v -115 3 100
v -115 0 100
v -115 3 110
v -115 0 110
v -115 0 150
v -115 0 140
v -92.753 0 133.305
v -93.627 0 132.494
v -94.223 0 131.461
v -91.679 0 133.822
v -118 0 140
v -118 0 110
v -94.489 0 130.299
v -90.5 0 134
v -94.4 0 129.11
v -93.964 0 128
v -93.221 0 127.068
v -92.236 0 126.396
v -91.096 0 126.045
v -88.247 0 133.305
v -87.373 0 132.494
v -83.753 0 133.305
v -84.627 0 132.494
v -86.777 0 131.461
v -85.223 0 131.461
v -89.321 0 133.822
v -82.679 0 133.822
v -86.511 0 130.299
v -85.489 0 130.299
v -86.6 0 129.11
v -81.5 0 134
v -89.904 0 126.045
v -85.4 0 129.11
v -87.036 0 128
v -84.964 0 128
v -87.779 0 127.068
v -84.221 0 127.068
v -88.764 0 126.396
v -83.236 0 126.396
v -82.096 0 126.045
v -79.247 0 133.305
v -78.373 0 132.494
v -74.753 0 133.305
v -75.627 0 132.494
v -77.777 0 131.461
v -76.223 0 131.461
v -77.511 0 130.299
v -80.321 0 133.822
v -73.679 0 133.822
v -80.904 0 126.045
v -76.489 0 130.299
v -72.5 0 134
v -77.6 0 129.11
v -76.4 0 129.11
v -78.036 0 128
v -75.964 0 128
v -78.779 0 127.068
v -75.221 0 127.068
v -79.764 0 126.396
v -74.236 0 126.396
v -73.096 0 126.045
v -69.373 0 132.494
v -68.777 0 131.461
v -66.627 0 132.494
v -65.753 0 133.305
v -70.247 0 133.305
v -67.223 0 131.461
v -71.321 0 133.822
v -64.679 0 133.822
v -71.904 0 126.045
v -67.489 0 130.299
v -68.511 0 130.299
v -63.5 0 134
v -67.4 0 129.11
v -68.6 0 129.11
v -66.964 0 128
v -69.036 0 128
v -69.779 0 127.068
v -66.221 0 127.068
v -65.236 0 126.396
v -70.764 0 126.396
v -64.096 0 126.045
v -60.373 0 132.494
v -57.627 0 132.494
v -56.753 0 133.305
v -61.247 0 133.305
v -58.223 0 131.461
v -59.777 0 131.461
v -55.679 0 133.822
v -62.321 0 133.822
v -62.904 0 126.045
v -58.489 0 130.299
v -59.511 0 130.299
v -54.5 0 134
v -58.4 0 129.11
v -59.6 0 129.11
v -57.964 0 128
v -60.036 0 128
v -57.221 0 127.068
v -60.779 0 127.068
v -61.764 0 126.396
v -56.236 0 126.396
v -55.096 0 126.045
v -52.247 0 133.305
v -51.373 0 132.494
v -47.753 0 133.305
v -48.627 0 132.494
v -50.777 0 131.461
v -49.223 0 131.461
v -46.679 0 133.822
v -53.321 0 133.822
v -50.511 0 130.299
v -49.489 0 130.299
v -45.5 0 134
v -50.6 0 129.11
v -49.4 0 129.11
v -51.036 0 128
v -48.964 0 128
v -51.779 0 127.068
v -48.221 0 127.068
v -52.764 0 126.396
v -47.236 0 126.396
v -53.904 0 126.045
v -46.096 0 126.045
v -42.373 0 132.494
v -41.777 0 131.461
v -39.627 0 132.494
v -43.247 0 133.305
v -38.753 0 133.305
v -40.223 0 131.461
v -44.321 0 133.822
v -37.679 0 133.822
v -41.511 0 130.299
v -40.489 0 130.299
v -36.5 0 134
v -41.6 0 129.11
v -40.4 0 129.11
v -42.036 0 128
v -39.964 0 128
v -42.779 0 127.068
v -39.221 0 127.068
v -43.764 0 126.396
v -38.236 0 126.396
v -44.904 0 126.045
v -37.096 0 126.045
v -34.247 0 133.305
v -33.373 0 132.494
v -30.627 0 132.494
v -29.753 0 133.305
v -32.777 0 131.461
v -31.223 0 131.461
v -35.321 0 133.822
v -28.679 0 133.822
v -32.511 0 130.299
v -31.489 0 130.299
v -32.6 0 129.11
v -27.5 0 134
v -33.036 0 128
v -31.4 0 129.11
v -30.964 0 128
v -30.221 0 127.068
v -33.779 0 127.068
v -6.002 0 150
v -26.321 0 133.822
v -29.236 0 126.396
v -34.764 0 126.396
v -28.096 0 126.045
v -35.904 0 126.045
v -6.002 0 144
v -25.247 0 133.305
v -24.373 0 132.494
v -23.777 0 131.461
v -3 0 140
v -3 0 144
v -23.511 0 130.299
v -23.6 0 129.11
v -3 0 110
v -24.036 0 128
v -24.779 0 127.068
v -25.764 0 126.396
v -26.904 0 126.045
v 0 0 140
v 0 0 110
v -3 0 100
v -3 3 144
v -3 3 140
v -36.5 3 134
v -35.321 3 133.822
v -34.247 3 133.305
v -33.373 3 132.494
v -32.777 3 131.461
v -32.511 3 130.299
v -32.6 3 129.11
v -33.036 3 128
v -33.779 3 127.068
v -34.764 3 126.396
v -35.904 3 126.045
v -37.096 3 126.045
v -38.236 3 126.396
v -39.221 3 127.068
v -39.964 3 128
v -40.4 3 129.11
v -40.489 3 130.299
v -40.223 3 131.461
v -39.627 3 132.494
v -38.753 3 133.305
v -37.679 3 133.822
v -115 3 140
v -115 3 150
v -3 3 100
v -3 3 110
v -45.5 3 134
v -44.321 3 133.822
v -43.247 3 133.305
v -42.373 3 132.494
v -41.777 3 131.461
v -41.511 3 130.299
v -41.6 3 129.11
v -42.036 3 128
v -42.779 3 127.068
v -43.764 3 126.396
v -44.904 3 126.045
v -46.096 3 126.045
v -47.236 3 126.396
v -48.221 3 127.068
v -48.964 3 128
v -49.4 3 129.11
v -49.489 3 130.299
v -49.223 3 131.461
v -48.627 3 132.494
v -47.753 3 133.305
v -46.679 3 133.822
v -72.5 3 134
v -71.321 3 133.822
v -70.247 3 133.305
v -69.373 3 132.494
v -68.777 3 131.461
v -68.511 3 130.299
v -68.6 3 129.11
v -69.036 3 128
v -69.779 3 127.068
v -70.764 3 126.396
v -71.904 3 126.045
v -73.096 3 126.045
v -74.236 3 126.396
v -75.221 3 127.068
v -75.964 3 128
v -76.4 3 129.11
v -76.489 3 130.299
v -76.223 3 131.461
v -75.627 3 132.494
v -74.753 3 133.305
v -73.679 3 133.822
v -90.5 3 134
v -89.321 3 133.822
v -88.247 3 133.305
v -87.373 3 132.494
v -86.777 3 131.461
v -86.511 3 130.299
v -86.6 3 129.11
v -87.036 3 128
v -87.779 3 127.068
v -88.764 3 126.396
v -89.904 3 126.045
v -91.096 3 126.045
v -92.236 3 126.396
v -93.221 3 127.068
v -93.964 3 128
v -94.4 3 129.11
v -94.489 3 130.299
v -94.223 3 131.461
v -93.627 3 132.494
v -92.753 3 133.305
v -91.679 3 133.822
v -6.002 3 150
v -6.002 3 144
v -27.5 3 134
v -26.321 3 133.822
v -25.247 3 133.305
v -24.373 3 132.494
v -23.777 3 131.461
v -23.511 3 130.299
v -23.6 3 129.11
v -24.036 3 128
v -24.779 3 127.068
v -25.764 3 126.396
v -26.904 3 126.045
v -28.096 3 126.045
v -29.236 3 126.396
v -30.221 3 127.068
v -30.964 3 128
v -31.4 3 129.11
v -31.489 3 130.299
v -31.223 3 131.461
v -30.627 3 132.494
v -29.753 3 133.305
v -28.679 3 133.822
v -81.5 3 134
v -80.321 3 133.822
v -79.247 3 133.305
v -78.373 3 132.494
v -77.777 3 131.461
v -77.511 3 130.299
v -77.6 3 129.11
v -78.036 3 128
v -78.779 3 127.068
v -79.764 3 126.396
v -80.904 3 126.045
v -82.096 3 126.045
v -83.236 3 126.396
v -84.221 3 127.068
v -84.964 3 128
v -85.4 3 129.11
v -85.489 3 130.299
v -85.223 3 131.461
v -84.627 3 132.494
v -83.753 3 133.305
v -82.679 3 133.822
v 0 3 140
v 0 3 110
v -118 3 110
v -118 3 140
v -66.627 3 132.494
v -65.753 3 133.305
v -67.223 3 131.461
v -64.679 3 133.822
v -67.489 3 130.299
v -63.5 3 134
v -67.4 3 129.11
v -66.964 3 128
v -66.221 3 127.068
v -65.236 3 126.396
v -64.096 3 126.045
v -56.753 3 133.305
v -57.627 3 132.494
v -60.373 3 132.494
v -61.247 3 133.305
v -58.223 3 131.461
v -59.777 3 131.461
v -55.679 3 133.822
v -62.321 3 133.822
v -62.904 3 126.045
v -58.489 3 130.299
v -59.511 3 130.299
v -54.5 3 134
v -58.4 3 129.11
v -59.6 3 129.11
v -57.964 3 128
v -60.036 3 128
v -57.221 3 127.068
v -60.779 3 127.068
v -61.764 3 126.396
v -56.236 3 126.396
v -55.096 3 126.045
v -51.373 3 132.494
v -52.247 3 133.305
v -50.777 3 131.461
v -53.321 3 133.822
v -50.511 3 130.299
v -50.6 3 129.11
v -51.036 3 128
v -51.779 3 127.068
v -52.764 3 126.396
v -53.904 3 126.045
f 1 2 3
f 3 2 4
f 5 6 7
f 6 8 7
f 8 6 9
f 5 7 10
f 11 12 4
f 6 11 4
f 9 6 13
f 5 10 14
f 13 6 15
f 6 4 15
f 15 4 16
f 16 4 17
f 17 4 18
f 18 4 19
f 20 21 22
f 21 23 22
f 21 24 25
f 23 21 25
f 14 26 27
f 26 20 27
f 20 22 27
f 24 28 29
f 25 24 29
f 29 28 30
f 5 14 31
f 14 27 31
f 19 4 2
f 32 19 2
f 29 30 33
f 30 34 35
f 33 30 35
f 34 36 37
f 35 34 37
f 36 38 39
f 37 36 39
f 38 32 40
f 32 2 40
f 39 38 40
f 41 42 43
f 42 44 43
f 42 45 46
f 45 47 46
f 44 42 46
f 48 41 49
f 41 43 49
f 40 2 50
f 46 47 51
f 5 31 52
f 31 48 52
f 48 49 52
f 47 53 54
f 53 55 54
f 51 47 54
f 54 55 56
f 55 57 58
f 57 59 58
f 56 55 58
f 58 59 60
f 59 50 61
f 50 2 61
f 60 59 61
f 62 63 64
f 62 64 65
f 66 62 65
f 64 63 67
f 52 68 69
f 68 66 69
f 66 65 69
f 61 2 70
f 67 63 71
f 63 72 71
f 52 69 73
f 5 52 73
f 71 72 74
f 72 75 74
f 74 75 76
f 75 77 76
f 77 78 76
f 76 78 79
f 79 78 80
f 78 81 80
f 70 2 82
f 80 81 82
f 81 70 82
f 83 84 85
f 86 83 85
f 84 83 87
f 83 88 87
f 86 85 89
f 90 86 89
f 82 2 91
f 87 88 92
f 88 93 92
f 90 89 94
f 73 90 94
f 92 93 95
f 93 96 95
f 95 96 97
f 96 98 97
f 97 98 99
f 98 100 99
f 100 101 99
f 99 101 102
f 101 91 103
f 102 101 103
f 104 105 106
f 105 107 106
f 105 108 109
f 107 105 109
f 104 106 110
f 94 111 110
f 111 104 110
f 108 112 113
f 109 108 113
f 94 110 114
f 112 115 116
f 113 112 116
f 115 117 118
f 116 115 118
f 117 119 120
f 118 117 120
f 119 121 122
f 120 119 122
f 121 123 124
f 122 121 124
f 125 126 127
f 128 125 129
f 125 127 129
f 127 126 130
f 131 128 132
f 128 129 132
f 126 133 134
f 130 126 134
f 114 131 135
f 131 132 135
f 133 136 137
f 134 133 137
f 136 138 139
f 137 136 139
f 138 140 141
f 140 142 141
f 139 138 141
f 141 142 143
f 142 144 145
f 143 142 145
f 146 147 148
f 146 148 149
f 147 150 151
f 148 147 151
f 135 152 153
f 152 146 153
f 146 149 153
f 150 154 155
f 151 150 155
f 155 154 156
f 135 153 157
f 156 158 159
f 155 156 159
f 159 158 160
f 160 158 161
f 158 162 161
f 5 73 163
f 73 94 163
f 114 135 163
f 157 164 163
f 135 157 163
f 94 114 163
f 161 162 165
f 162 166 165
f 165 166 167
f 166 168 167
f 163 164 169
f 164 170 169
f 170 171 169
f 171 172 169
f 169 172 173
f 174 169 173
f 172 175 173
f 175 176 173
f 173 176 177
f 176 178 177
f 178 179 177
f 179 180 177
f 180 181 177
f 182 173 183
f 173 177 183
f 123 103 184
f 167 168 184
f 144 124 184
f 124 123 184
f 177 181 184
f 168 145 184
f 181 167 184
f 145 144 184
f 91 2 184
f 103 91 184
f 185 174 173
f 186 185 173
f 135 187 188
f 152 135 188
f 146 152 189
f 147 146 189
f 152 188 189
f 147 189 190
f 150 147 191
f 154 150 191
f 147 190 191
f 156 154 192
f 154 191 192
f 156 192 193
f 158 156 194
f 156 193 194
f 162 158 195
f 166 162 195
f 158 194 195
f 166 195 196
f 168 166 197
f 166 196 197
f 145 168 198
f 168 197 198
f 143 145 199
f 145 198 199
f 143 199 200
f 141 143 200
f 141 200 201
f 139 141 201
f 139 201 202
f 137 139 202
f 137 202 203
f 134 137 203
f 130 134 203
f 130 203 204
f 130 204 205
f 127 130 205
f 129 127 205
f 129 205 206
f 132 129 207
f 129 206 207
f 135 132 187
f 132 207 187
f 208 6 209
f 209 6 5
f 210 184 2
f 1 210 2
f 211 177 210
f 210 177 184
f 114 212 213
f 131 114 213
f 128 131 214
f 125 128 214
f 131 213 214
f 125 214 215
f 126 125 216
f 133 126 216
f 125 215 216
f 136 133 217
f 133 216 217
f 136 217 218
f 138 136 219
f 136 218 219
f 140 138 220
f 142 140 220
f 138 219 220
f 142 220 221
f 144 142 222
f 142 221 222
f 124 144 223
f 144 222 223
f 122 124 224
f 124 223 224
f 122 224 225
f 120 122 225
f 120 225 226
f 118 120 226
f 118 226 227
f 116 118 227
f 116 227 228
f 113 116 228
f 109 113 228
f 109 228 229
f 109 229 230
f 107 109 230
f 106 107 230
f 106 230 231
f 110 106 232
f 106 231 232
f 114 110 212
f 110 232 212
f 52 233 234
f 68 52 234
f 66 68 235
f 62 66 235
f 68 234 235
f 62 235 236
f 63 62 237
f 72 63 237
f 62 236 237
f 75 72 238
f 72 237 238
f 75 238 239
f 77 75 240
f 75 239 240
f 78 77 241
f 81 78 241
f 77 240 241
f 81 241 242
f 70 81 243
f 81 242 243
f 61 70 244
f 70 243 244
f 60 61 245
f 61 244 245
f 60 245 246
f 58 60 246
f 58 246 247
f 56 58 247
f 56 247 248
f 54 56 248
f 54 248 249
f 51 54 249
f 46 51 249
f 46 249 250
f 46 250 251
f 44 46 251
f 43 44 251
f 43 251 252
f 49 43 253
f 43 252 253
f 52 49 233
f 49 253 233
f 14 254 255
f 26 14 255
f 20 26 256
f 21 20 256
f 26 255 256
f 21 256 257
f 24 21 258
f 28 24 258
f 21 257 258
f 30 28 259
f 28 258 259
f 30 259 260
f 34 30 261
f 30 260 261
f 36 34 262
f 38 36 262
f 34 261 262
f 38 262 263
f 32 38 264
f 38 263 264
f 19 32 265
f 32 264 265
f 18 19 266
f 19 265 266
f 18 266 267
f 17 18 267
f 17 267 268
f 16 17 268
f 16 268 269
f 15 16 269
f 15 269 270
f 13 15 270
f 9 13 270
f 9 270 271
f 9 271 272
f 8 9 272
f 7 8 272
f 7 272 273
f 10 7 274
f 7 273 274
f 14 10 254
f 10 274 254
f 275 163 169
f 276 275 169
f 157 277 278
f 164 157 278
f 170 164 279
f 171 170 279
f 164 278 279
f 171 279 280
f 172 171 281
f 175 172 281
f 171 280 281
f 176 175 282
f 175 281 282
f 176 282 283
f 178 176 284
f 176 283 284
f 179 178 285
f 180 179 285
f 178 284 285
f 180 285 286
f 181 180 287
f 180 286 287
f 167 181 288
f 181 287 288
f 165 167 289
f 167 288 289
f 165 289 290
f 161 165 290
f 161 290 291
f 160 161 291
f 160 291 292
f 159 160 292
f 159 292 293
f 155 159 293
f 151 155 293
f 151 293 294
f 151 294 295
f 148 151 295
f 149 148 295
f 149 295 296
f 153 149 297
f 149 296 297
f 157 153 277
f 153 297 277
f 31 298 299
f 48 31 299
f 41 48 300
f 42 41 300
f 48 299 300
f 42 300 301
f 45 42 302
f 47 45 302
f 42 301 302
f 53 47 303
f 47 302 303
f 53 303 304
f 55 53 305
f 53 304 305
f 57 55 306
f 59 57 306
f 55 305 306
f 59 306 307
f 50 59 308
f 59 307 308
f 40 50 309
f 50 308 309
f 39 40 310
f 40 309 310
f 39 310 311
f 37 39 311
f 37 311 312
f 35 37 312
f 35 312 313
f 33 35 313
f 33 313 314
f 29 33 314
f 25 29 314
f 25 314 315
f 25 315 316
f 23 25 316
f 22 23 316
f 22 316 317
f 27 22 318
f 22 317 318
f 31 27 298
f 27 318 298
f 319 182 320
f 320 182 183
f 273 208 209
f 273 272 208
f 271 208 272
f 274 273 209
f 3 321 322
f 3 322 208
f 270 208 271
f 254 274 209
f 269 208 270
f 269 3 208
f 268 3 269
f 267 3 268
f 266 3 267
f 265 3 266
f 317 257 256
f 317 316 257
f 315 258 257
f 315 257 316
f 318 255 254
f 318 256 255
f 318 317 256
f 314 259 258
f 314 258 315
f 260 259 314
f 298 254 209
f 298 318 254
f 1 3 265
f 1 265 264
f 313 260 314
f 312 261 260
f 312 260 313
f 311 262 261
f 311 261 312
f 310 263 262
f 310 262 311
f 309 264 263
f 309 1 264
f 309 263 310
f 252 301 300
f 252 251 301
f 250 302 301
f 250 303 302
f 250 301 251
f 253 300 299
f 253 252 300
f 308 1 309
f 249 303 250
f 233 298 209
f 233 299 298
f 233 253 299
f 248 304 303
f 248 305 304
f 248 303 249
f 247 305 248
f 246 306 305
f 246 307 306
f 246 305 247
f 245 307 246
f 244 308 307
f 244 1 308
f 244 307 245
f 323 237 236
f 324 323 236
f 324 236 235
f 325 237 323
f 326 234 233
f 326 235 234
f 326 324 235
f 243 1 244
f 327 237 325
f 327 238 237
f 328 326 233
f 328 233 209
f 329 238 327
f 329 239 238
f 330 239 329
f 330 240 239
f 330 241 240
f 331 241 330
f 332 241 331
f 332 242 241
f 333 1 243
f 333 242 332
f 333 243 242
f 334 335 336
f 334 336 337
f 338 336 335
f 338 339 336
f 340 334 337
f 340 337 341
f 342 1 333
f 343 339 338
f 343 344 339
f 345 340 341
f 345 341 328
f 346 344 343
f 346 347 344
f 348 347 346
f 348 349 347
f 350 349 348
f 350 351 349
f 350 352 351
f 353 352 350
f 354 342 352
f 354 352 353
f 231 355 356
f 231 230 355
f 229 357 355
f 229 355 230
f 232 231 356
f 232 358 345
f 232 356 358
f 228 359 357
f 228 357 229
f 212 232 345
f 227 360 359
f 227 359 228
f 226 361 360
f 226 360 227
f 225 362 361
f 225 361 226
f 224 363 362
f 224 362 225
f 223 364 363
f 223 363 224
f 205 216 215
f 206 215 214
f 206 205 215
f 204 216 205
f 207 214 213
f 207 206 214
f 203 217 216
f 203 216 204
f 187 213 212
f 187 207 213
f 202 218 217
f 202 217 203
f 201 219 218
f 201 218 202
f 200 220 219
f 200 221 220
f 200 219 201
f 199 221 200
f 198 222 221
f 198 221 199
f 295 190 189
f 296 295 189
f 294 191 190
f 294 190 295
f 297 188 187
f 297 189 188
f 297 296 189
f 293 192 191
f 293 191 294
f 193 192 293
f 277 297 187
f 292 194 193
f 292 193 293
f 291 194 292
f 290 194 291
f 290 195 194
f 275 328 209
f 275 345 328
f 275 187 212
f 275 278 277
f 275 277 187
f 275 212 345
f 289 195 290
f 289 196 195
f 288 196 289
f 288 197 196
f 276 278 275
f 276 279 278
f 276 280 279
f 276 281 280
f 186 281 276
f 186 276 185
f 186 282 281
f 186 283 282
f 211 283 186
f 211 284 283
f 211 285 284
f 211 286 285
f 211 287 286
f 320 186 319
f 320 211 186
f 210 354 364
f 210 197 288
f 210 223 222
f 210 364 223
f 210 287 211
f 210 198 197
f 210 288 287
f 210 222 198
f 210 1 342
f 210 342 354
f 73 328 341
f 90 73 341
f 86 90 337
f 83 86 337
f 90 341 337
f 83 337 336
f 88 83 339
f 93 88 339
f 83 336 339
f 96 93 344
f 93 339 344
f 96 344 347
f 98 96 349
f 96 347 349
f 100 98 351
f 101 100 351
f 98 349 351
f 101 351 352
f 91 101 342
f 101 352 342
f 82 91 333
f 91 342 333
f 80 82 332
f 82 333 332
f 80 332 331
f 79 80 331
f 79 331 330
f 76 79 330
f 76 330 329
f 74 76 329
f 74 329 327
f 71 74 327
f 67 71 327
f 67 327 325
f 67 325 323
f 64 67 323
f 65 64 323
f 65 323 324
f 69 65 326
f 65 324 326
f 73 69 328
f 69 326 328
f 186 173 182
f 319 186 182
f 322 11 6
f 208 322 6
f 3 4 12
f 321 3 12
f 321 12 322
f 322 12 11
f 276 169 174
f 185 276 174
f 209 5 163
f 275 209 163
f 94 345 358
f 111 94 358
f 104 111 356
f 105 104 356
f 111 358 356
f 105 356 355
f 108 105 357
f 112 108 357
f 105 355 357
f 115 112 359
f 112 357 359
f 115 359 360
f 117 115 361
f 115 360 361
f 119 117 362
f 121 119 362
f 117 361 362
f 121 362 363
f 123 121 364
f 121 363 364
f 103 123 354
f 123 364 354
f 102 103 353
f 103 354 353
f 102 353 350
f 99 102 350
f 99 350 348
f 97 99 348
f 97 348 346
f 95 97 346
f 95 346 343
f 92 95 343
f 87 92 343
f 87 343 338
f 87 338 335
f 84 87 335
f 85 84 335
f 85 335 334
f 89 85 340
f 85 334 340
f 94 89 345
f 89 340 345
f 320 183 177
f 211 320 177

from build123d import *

# Parameters (mm, degrees)
LED_1_OUTLINE_R     = 2.25
LED_1_DEPTH         = 3
SKETCH_1_R          = 4
CUT_EXTRUDE_1_DEPTH = 3


# Read off the part's stored shape, not the designer's step: 基体零件-LED板-1
with BuildPart() as part:
    # 基体零件-LED板-1 outline → 基体零件-LED板-1 (new body)
    with BuildSketch(Plane(origin=(0, 0, 0), x_dir=(1, 0, 0), z_dir=(0, 1, 0))):
        Polygon((-3, -140), (0, -140), (0, -110), (-3, -110), (-3, -100), (-115, -100), (-115, -110), (-118, -110), (-118, -140), (-115, -140), (-115, -150), (-6.001970153, -150), (-6.001970153, -144), (-3, -144), align=None)
        with Locations((-90.5, -130)):
            Circle(LED_1_OUTLINE_R, mode=Mode.SUBTRACT)
        with Locations((-81.5, -130)):
            Circle(LED_1_OUTLINE_R, mode=Mode.SUBTRACT)
        with Locations((-72.5, -130)):
            Circle(LED_1_OUTLINE_R, mode=Mode.SUBTRACT)
        with Locations((-63.5, -130)):
            Circle(LED_1_OUTLINE_R, mode=Mode.SUBTRACT)
        with Locations((-54.5, -130)):
            Circle(LED_1_OUTLINE_R, mode=Mode.SUBTRACT)
        with Locations((-45.5, -130)):
            Circle(LED_1_OUTLINE_R, mode=Mode.SUBTRACT)
        with Locations((-36.5, -130)):
            Circle(LED_1_OUTLINE_R, mode=Mode.SUBTRACT)
        with Locations((-27.5, -130)):
            Circle(LED_1_OUTLINE_R, mode=Mode.SUBTRACT)
    extrude(amount=LED_1_DEPTH)

    # 草图1 → 切除-拉伸1 (cut)
    with BuildSketch(Plane(origin=(0, 3, 0), x_dir=(1, 0, 0), z_dir=(0, 1, 0))):
        with Locations(Location((-90.5, -130, 0), (0, 0, 270))):
            Circle(SKETCH_1_R)
        with Locations(Location((-81.5, -130, 0), (0, 0, 270))):
            Circle(SKETCH_1_R)
        with Locations(Location((-72.5, -130, 0), (0, 0, 270))):
            Circle(SKETCH_1_R)
        with Locations(Location((-63.5, -130, 0), (0, 0, 270))):
            Circle(SKETCH_1_R)
        with Locations(Location((-54.5, -130, 0), (0, 0, 270))):
            Circle(SKETCH_1_R)
        with Locations(Location((-45.5, -130, 0), (0, 0, 270))):
            Circle(SKETCH_1_R)
        with Locations(Location((-36.5, -130, 0), (0, 0, 270))):
            Circle(SKETCH_1_R)
        with Locations(Location((-27.5, -130, 0), (0, 0, 270))):
            Circle(SKETCH_1_R)
    extrude(amount=-CUT_EXTRUDE_1_DEPTH, mode=Mode.SUBTRACT)


solid = part.part
